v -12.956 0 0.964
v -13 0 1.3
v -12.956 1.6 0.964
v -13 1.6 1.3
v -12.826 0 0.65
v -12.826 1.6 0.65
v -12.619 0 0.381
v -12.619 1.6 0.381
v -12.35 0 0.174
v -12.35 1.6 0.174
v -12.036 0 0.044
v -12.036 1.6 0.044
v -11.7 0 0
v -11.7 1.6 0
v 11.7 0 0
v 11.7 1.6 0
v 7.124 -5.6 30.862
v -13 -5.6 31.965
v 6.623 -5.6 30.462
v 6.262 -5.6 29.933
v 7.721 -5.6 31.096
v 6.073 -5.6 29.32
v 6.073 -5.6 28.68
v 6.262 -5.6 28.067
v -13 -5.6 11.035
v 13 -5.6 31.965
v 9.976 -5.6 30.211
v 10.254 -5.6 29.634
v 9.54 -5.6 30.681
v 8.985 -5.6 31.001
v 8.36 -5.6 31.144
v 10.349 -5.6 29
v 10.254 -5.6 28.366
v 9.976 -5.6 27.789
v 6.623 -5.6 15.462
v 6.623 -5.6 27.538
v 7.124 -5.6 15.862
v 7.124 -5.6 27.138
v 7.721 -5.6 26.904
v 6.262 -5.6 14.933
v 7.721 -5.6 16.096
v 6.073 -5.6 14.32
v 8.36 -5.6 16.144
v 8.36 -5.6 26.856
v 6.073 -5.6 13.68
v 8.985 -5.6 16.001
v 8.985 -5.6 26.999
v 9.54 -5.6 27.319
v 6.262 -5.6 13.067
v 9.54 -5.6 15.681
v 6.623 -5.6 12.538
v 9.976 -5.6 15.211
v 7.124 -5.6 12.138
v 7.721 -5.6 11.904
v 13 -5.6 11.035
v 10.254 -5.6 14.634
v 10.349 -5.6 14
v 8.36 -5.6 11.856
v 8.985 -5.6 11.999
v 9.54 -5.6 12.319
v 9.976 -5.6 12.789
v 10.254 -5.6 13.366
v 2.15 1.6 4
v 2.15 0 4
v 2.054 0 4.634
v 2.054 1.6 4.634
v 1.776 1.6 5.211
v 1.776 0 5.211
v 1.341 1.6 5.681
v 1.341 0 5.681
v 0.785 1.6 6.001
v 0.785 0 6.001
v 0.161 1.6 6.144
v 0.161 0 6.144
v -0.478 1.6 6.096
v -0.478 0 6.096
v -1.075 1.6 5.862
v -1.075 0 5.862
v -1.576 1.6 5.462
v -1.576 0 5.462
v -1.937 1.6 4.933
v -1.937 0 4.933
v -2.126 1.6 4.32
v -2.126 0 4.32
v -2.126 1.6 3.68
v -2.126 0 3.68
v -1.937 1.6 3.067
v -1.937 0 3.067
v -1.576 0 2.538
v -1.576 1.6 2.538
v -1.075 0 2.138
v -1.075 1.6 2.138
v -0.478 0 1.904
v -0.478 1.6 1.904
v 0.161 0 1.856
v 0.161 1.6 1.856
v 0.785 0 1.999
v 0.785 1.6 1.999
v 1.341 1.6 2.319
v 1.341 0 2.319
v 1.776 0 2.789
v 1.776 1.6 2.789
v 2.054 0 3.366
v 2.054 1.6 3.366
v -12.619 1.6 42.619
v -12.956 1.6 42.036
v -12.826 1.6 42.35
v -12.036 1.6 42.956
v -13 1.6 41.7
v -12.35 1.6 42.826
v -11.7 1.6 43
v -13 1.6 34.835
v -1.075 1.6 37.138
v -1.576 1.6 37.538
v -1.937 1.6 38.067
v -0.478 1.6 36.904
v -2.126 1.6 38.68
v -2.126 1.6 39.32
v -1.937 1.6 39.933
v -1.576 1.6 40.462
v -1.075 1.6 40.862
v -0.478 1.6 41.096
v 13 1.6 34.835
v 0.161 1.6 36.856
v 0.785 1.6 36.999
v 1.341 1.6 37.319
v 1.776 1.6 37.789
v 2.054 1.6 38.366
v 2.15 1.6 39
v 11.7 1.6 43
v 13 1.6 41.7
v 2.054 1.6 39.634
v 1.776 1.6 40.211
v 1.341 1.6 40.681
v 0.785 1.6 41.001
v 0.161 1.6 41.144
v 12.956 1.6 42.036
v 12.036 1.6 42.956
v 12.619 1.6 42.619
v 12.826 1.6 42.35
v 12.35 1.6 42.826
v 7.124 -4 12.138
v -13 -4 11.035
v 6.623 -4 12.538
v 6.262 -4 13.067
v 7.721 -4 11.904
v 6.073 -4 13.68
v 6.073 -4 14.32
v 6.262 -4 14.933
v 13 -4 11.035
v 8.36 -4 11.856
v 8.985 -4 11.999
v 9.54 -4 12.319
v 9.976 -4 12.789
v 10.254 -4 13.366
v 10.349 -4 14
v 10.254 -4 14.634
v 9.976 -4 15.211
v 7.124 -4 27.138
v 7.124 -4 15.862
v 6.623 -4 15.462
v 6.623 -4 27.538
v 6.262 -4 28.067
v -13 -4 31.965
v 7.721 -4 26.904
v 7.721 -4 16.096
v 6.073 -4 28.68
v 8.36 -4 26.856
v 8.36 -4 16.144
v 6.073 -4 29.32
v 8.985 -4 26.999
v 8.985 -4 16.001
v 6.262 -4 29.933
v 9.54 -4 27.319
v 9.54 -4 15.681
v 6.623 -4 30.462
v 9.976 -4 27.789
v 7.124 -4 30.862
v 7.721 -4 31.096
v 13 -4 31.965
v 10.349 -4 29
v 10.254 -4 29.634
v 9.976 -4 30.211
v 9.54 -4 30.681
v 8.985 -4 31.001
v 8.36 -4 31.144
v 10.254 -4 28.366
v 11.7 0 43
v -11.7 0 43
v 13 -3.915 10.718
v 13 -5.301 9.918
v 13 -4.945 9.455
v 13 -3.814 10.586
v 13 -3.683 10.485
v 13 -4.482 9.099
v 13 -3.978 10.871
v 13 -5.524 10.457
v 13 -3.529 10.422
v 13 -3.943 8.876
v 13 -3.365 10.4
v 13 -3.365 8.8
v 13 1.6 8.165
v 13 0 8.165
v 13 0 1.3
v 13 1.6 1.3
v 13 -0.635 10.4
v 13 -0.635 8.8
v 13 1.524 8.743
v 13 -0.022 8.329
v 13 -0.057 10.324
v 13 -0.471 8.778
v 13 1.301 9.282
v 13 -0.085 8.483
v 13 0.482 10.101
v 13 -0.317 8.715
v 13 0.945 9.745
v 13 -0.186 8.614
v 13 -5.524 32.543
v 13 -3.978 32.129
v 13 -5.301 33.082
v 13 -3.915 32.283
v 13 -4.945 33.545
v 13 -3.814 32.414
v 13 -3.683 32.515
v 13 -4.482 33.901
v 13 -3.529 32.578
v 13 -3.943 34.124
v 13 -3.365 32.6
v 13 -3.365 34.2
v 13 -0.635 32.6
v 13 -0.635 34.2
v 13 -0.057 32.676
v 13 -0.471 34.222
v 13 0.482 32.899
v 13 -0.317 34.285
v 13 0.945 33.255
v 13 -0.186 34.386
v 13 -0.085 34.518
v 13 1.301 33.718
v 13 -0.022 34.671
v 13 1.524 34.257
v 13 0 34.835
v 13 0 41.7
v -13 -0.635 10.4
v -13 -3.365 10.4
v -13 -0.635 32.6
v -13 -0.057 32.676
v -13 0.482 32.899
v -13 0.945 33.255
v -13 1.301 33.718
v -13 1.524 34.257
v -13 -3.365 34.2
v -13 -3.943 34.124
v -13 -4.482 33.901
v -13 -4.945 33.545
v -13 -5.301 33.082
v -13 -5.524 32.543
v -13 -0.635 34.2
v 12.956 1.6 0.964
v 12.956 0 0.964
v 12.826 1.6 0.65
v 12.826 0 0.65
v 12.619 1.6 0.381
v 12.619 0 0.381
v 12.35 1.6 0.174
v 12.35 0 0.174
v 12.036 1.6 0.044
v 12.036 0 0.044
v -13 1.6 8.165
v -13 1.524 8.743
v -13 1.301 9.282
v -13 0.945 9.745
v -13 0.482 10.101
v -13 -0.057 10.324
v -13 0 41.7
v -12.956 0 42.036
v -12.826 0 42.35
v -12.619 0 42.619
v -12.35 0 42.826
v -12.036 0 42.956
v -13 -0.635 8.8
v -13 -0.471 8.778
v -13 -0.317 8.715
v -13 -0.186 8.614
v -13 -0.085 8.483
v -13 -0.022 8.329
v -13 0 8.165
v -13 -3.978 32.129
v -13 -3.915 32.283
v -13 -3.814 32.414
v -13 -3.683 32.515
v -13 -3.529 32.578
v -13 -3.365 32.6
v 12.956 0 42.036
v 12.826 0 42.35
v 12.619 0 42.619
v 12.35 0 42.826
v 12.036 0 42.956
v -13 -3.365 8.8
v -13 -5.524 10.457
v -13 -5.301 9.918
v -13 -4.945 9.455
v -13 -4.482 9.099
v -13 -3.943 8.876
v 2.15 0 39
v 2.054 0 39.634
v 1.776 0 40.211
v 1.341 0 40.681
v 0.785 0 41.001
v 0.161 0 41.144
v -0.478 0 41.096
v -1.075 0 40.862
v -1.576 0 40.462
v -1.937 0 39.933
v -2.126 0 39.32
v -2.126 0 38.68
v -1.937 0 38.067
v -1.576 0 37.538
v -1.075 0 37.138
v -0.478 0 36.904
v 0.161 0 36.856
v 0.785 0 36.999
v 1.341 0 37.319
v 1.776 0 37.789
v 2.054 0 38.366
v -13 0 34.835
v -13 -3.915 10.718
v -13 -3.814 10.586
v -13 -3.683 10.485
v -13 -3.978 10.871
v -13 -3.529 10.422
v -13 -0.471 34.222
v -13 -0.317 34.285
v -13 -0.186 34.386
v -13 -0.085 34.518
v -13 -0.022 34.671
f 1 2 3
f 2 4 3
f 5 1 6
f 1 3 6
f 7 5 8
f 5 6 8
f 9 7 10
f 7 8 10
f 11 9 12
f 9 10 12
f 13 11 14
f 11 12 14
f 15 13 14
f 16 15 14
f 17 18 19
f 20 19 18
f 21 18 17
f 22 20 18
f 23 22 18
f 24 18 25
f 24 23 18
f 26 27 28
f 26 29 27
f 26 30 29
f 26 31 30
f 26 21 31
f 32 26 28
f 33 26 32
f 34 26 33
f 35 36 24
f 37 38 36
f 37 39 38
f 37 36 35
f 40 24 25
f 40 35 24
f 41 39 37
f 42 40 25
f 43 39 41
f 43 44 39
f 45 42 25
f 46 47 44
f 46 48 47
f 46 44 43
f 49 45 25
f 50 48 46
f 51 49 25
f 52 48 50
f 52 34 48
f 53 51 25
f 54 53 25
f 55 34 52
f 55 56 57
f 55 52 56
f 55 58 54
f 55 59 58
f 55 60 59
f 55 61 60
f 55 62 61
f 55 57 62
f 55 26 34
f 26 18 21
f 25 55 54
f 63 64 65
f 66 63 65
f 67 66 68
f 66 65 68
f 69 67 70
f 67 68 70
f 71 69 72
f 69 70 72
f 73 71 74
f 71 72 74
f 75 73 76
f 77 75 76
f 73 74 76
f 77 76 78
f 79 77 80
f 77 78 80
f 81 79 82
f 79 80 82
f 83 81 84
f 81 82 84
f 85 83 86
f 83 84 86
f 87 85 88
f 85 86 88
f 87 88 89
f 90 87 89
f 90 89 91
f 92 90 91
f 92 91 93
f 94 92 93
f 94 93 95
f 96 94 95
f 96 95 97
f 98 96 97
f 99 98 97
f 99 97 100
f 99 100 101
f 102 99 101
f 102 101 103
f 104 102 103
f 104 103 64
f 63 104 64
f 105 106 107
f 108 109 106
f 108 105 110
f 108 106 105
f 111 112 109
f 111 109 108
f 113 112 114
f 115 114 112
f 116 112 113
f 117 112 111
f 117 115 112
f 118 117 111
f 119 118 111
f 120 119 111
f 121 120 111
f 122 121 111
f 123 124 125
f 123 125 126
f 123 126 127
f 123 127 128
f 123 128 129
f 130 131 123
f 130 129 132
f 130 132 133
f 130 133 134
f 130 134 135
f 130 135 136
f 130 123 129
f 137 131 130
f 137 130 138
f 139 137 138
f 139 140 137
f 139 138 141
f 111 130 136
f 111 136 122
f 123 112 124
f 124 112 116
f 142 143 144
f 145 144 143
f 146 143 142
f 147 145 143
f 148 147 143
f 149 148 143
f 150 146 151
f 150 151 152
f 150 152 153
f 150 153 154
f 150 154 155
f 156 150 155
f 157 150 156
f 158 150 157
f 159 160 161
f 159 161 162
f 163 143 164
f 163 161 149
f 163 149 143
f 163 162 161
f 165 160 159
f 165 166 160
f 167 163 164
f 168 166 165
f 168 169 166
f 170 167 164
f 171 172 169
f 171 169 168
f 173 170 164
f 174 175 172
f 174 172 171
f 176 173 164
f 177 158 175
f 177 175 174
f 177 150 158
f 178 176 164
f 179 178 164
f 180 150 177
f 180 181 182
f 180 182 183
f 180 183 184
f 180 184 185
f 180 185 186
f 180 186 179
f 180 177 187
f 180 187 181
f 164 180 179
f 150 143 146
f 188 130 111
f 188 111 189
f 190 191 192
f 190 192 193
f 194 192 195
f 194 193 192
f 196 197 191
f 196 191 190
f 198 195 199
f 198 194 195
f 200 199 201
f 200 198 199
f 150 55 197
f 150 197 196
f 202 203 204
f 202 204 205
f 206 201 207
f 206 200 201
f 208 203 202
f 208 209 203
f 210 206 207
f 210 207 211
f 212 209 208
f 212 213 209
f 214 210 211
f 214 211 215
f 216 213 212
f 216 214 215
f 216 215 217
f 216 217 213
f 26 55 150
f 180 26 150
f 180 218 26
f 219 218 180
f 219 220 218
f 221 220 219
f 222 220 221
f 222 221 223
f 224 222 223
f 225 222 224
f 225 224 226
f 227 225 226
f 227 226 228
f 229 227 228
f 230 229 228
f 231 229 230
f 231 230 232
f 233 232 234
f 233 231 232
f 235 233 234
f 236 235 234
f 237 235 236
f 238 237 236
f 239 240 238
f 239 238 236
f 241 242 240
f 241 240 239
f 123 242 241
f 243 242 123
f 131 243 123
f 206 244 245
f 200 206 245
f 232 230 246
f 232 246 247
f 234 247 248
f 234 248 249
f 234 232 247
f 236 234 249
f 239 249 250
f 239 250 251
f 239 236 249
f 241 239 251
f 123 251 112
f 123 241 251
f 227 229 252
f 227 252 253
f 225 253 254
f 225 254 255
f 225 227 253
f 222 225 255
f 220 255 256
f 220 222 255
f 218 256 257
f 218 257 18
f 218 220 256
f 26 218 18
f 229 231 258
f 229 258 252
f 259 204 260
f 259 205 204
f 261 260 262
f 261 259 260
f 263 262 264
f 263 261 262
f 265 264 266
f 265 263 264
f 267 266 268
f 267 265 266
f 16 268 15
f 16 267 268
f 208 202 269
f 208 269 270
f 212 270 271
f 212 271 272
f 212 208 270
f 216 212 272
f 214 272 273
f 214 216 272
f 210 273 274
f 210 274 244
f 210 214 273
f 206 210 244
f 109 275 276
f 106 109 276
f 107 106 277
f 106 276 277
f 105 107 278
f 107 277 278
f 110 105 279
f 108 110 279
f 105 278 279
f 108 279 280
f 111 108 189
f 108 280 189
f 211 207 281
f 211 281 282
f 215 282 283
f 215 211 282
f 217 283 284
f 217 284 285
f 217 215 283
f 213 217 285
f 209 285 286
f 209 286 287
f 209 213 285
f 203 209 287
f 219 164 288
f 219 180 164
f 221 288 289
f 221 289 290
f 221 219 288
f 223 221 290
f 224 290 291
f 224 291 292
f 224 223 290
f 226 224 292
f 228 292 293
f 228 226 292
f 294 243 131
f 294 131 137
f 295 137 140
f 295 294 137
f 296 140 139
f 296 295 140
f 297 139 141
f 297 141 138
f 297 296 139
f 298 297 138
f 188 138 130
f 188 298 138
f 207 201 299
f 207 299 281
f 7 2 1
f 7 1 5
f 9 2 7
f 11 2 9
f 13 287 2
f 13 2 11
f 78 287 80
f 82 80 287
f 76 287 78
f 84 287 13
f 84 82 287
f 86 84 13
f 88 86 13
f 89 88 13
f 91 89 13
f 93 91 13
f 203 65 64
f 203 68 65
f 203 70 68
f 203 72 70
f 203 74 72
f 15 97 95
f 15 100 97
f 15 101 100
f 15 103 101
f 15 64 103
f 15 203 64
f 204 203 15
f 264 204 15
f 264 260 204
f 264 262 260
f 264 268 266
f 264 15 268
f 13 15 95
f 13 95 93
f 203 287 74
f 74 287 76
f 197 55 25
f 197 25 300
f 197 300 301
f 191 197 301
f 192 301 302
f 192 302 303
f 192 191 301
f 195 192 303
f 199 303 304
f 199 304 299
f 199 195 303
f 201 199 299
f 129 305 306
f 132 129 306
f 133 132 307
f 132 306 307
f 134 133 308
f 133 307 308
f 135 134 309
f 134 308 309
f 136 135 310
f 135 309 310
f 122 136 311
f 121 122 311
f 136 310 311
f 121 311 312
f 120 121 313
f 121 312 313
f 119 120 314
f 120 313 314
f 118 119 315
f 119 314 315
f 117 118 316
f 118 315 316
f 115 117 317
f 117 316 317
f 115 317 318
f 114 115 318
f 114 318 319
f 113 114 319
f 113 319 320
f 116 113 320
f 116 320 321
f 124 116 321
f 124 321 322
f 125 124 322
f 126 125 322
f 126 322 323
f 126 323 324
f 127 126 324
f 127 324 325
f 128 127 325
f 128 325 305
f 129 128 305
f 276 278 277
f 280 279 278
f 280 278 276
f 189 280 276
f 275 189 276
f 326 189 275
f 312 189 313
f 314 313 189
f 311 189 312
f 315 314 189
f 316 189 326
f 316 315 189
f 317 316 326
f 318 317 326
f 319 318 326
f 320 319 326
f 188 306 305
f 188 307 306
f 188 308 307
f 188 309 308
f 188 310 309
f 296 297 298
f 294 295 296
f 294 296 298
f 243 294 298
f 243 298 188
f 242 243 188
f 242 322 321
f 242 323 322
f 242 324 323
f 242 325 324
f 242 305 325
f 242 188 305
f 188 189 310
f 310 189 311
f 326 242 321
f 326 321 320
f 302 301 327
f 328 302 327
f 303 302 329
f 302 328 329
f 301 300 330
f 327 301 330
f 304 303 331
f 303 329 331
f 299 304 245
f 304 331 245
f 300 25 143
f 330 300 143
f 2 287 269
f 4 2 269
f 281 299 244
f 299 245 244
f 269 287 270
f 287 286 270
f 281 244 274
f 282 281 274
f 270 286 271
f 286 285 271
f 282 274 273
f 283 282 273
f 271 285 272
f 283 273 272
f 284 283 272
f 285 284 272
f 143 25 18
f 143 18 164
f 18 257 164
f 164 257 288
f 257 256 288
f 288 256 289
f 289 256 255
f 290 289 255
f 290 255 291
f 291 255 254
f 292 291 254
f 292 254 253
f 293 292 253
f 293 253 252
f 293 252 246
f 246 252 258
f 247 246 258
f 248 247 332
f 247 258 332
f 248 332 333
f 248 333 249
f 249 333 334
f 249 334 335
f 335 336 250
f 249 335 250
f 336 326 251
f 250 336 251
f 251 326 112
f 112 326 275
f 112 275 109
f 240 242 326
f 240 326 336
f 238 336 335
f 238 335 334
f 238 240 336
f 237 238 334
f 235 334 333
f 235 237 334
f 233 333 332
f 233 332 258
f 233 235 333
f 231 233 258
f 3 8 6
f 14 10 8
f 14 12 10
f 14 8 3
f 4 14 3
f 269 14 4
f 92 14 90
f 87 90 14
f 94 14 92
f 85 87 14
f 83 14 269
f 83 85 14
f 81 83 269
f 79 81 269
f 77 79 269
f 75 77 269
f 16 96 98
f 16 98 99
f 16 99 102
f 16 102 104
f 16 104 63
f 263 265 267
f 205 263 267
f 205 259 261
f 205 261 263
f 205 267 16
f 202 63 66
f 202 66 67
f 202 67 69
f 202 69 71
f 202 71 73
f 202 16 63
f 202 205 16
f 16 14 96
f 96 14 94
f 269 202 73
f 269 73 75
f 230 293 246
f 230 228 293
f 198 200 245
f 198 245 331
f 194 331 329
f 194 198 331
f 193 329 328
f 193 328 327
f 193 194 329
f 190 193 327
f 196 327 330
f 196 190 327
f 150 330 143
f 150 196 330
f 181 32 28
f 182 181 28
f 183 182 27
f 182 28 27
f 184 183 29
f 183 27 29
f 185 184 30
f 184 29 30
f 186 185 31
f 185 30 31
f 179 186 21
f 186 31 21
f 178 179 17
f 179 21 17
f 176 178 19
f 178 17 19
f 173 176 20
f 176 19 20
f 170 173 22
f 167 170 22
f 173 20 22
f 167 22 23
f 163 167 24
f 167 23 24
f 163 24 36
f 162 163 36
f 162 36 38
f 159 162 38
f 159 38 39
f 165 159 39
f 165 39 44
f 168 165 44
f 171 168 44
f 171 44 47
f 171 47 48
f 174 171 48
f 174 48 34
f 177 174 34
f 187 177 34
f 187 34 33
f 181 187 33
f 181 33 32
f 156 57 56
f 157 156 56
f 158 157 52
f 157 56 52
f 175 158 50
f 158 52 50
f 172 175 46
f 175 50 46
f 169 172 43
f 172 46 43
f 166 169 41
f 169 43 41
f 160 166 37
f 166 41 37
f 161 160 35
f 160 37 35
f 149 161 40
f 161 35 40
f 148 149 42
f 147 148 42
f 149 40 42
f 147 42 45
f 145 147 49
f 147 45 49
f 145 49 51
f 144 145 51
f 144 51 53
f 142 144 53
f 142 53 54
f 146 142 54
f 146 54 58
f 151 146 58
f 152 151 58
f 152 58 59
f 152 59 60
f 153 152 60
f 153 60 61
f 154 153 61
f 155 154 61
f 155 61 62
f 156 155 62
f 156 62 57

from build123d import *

# Parameters (mm, degrees)
F1_DEPTH = 13
F2_R     = 2.15
F3_DEPTH = 7.2010003069
F4_R     = 1.3


# Not quite as in the source:
# - ends of sketch curves that miss each other by under 0.0002 mm in the source are joined


with BuildPart() as f1:
    # F0 (on Right) → F1 (new body, symmetric)
    with BuildSketch(Plane.YZ):
        with BuildLine():
            Line((-3.3650011141, 32.6000002232), (-0.6352006896, 32.6000002232))
            ThreePointArc((-0.6352006896, 32.6000002232), (0.9453246879, 33.2546752703), (1.5999997349, 34.8352006478))
            Line((1.5999997349, 34.8352006478), (1.5999997349, 41.7300015539))
            Line((1.5999997349, 41.7300015539), (1.5999997349, 43.0000009998))
            Line((1.5999997349, 43.0000009998), (0, 43))
            Line((0, 43), (0, 41.7300015539))
            Line((0, 41.7300015539), (0, 34.8350006809))
            ThreePointArc((0, 34.8350006809), (-0.1859871128, 34.3859880708), (-0.634999723, 34.200000958))
            Line((-0.634999723, 34.200000958), (-3.3648001474, 34.200000958))
            ThreePointArc((-3.3648001474, 34.200000958), (-4.945325525, 33.5453259109), (-5.600000572, 31.9648005334))
            Line((-5.600000572, 31.9648005334), (-5.600000572, 11.0352004664))
            ThreePointArc((-5.600000572, 11.0352004664), (-4.945325525, 9.4546750889), (-3.3648001474, 8.8000000419))
            Line((-3.3648001474, 8.8000000419), (-0.634999723, 8.8000000419))
            ThreePointArc((-0.634999723, 8.8000000419), (-0.1859871128, 8.6140129291), (0, 8.1650003189))
            Line((0, 8.1650003189), (0, 1.2700004457))
            Line((0, 1.2700004457), (0, 0))
            Line((0, 0), (1.5999997349, 0))
            Line((1.5999997349, 0), (1.5999997349, 1.2700004457))
            Line((1.5999997349, 1.2700004457), (1.5999997349, 8.1648003521))
            ThreePointArc((1.5999997349, 8.1648003521), (0.9453246879, 9.7453257296), (-0.6352006896, 10.4000007766))
            Line((-0.6352006896, 10.4000007766), (-3.3650011141, 10.4000007766))
            ThreePointArc((-3.3650011141, 10.4000007766), (-3.8140137243, 10.5859878894), (-4.0000008371, 11.0350004996))
            Line((-4.0000008371, 11.0350004996), (-4.0000008371, 31.9650005003))
            ThreePointArc((-4.0000008371, 31.9650005003), (-3.8140137243, 32.4140131104), (-3.3650011141, 32.6000002232))
        make_face()
    extrude(amount=F1_DEPTH, both=True)

    # F2 (on face) → F3 (cut, through all)
    with BuildSketch(Plane.XZ.offset(5.600000572)):
        with Locations((0, 4)):
            Circle(F2_R)
        with Locations((0, 39)):
            Circle(F2_R)
        with Locations((8.1994, 29)):
            Circle(F2_R)
        with Locations((8.1994, 14)):
            Circle(F2_R)
    extrude(amount=-F3_DEPTH, mode=Mode.SUBTRACT)

    # F4
    f4_edges = [f1.edges().sort_by_distance(p)[0] for p in [
        (-13, 0.8, 43),
        (-13, 0.8, 0),
        (13, 0.8, 0),
        (13, 0.8, 43),
    ]]
    fillet(f4_edges, radius=F4_R)


solid = f1.part
